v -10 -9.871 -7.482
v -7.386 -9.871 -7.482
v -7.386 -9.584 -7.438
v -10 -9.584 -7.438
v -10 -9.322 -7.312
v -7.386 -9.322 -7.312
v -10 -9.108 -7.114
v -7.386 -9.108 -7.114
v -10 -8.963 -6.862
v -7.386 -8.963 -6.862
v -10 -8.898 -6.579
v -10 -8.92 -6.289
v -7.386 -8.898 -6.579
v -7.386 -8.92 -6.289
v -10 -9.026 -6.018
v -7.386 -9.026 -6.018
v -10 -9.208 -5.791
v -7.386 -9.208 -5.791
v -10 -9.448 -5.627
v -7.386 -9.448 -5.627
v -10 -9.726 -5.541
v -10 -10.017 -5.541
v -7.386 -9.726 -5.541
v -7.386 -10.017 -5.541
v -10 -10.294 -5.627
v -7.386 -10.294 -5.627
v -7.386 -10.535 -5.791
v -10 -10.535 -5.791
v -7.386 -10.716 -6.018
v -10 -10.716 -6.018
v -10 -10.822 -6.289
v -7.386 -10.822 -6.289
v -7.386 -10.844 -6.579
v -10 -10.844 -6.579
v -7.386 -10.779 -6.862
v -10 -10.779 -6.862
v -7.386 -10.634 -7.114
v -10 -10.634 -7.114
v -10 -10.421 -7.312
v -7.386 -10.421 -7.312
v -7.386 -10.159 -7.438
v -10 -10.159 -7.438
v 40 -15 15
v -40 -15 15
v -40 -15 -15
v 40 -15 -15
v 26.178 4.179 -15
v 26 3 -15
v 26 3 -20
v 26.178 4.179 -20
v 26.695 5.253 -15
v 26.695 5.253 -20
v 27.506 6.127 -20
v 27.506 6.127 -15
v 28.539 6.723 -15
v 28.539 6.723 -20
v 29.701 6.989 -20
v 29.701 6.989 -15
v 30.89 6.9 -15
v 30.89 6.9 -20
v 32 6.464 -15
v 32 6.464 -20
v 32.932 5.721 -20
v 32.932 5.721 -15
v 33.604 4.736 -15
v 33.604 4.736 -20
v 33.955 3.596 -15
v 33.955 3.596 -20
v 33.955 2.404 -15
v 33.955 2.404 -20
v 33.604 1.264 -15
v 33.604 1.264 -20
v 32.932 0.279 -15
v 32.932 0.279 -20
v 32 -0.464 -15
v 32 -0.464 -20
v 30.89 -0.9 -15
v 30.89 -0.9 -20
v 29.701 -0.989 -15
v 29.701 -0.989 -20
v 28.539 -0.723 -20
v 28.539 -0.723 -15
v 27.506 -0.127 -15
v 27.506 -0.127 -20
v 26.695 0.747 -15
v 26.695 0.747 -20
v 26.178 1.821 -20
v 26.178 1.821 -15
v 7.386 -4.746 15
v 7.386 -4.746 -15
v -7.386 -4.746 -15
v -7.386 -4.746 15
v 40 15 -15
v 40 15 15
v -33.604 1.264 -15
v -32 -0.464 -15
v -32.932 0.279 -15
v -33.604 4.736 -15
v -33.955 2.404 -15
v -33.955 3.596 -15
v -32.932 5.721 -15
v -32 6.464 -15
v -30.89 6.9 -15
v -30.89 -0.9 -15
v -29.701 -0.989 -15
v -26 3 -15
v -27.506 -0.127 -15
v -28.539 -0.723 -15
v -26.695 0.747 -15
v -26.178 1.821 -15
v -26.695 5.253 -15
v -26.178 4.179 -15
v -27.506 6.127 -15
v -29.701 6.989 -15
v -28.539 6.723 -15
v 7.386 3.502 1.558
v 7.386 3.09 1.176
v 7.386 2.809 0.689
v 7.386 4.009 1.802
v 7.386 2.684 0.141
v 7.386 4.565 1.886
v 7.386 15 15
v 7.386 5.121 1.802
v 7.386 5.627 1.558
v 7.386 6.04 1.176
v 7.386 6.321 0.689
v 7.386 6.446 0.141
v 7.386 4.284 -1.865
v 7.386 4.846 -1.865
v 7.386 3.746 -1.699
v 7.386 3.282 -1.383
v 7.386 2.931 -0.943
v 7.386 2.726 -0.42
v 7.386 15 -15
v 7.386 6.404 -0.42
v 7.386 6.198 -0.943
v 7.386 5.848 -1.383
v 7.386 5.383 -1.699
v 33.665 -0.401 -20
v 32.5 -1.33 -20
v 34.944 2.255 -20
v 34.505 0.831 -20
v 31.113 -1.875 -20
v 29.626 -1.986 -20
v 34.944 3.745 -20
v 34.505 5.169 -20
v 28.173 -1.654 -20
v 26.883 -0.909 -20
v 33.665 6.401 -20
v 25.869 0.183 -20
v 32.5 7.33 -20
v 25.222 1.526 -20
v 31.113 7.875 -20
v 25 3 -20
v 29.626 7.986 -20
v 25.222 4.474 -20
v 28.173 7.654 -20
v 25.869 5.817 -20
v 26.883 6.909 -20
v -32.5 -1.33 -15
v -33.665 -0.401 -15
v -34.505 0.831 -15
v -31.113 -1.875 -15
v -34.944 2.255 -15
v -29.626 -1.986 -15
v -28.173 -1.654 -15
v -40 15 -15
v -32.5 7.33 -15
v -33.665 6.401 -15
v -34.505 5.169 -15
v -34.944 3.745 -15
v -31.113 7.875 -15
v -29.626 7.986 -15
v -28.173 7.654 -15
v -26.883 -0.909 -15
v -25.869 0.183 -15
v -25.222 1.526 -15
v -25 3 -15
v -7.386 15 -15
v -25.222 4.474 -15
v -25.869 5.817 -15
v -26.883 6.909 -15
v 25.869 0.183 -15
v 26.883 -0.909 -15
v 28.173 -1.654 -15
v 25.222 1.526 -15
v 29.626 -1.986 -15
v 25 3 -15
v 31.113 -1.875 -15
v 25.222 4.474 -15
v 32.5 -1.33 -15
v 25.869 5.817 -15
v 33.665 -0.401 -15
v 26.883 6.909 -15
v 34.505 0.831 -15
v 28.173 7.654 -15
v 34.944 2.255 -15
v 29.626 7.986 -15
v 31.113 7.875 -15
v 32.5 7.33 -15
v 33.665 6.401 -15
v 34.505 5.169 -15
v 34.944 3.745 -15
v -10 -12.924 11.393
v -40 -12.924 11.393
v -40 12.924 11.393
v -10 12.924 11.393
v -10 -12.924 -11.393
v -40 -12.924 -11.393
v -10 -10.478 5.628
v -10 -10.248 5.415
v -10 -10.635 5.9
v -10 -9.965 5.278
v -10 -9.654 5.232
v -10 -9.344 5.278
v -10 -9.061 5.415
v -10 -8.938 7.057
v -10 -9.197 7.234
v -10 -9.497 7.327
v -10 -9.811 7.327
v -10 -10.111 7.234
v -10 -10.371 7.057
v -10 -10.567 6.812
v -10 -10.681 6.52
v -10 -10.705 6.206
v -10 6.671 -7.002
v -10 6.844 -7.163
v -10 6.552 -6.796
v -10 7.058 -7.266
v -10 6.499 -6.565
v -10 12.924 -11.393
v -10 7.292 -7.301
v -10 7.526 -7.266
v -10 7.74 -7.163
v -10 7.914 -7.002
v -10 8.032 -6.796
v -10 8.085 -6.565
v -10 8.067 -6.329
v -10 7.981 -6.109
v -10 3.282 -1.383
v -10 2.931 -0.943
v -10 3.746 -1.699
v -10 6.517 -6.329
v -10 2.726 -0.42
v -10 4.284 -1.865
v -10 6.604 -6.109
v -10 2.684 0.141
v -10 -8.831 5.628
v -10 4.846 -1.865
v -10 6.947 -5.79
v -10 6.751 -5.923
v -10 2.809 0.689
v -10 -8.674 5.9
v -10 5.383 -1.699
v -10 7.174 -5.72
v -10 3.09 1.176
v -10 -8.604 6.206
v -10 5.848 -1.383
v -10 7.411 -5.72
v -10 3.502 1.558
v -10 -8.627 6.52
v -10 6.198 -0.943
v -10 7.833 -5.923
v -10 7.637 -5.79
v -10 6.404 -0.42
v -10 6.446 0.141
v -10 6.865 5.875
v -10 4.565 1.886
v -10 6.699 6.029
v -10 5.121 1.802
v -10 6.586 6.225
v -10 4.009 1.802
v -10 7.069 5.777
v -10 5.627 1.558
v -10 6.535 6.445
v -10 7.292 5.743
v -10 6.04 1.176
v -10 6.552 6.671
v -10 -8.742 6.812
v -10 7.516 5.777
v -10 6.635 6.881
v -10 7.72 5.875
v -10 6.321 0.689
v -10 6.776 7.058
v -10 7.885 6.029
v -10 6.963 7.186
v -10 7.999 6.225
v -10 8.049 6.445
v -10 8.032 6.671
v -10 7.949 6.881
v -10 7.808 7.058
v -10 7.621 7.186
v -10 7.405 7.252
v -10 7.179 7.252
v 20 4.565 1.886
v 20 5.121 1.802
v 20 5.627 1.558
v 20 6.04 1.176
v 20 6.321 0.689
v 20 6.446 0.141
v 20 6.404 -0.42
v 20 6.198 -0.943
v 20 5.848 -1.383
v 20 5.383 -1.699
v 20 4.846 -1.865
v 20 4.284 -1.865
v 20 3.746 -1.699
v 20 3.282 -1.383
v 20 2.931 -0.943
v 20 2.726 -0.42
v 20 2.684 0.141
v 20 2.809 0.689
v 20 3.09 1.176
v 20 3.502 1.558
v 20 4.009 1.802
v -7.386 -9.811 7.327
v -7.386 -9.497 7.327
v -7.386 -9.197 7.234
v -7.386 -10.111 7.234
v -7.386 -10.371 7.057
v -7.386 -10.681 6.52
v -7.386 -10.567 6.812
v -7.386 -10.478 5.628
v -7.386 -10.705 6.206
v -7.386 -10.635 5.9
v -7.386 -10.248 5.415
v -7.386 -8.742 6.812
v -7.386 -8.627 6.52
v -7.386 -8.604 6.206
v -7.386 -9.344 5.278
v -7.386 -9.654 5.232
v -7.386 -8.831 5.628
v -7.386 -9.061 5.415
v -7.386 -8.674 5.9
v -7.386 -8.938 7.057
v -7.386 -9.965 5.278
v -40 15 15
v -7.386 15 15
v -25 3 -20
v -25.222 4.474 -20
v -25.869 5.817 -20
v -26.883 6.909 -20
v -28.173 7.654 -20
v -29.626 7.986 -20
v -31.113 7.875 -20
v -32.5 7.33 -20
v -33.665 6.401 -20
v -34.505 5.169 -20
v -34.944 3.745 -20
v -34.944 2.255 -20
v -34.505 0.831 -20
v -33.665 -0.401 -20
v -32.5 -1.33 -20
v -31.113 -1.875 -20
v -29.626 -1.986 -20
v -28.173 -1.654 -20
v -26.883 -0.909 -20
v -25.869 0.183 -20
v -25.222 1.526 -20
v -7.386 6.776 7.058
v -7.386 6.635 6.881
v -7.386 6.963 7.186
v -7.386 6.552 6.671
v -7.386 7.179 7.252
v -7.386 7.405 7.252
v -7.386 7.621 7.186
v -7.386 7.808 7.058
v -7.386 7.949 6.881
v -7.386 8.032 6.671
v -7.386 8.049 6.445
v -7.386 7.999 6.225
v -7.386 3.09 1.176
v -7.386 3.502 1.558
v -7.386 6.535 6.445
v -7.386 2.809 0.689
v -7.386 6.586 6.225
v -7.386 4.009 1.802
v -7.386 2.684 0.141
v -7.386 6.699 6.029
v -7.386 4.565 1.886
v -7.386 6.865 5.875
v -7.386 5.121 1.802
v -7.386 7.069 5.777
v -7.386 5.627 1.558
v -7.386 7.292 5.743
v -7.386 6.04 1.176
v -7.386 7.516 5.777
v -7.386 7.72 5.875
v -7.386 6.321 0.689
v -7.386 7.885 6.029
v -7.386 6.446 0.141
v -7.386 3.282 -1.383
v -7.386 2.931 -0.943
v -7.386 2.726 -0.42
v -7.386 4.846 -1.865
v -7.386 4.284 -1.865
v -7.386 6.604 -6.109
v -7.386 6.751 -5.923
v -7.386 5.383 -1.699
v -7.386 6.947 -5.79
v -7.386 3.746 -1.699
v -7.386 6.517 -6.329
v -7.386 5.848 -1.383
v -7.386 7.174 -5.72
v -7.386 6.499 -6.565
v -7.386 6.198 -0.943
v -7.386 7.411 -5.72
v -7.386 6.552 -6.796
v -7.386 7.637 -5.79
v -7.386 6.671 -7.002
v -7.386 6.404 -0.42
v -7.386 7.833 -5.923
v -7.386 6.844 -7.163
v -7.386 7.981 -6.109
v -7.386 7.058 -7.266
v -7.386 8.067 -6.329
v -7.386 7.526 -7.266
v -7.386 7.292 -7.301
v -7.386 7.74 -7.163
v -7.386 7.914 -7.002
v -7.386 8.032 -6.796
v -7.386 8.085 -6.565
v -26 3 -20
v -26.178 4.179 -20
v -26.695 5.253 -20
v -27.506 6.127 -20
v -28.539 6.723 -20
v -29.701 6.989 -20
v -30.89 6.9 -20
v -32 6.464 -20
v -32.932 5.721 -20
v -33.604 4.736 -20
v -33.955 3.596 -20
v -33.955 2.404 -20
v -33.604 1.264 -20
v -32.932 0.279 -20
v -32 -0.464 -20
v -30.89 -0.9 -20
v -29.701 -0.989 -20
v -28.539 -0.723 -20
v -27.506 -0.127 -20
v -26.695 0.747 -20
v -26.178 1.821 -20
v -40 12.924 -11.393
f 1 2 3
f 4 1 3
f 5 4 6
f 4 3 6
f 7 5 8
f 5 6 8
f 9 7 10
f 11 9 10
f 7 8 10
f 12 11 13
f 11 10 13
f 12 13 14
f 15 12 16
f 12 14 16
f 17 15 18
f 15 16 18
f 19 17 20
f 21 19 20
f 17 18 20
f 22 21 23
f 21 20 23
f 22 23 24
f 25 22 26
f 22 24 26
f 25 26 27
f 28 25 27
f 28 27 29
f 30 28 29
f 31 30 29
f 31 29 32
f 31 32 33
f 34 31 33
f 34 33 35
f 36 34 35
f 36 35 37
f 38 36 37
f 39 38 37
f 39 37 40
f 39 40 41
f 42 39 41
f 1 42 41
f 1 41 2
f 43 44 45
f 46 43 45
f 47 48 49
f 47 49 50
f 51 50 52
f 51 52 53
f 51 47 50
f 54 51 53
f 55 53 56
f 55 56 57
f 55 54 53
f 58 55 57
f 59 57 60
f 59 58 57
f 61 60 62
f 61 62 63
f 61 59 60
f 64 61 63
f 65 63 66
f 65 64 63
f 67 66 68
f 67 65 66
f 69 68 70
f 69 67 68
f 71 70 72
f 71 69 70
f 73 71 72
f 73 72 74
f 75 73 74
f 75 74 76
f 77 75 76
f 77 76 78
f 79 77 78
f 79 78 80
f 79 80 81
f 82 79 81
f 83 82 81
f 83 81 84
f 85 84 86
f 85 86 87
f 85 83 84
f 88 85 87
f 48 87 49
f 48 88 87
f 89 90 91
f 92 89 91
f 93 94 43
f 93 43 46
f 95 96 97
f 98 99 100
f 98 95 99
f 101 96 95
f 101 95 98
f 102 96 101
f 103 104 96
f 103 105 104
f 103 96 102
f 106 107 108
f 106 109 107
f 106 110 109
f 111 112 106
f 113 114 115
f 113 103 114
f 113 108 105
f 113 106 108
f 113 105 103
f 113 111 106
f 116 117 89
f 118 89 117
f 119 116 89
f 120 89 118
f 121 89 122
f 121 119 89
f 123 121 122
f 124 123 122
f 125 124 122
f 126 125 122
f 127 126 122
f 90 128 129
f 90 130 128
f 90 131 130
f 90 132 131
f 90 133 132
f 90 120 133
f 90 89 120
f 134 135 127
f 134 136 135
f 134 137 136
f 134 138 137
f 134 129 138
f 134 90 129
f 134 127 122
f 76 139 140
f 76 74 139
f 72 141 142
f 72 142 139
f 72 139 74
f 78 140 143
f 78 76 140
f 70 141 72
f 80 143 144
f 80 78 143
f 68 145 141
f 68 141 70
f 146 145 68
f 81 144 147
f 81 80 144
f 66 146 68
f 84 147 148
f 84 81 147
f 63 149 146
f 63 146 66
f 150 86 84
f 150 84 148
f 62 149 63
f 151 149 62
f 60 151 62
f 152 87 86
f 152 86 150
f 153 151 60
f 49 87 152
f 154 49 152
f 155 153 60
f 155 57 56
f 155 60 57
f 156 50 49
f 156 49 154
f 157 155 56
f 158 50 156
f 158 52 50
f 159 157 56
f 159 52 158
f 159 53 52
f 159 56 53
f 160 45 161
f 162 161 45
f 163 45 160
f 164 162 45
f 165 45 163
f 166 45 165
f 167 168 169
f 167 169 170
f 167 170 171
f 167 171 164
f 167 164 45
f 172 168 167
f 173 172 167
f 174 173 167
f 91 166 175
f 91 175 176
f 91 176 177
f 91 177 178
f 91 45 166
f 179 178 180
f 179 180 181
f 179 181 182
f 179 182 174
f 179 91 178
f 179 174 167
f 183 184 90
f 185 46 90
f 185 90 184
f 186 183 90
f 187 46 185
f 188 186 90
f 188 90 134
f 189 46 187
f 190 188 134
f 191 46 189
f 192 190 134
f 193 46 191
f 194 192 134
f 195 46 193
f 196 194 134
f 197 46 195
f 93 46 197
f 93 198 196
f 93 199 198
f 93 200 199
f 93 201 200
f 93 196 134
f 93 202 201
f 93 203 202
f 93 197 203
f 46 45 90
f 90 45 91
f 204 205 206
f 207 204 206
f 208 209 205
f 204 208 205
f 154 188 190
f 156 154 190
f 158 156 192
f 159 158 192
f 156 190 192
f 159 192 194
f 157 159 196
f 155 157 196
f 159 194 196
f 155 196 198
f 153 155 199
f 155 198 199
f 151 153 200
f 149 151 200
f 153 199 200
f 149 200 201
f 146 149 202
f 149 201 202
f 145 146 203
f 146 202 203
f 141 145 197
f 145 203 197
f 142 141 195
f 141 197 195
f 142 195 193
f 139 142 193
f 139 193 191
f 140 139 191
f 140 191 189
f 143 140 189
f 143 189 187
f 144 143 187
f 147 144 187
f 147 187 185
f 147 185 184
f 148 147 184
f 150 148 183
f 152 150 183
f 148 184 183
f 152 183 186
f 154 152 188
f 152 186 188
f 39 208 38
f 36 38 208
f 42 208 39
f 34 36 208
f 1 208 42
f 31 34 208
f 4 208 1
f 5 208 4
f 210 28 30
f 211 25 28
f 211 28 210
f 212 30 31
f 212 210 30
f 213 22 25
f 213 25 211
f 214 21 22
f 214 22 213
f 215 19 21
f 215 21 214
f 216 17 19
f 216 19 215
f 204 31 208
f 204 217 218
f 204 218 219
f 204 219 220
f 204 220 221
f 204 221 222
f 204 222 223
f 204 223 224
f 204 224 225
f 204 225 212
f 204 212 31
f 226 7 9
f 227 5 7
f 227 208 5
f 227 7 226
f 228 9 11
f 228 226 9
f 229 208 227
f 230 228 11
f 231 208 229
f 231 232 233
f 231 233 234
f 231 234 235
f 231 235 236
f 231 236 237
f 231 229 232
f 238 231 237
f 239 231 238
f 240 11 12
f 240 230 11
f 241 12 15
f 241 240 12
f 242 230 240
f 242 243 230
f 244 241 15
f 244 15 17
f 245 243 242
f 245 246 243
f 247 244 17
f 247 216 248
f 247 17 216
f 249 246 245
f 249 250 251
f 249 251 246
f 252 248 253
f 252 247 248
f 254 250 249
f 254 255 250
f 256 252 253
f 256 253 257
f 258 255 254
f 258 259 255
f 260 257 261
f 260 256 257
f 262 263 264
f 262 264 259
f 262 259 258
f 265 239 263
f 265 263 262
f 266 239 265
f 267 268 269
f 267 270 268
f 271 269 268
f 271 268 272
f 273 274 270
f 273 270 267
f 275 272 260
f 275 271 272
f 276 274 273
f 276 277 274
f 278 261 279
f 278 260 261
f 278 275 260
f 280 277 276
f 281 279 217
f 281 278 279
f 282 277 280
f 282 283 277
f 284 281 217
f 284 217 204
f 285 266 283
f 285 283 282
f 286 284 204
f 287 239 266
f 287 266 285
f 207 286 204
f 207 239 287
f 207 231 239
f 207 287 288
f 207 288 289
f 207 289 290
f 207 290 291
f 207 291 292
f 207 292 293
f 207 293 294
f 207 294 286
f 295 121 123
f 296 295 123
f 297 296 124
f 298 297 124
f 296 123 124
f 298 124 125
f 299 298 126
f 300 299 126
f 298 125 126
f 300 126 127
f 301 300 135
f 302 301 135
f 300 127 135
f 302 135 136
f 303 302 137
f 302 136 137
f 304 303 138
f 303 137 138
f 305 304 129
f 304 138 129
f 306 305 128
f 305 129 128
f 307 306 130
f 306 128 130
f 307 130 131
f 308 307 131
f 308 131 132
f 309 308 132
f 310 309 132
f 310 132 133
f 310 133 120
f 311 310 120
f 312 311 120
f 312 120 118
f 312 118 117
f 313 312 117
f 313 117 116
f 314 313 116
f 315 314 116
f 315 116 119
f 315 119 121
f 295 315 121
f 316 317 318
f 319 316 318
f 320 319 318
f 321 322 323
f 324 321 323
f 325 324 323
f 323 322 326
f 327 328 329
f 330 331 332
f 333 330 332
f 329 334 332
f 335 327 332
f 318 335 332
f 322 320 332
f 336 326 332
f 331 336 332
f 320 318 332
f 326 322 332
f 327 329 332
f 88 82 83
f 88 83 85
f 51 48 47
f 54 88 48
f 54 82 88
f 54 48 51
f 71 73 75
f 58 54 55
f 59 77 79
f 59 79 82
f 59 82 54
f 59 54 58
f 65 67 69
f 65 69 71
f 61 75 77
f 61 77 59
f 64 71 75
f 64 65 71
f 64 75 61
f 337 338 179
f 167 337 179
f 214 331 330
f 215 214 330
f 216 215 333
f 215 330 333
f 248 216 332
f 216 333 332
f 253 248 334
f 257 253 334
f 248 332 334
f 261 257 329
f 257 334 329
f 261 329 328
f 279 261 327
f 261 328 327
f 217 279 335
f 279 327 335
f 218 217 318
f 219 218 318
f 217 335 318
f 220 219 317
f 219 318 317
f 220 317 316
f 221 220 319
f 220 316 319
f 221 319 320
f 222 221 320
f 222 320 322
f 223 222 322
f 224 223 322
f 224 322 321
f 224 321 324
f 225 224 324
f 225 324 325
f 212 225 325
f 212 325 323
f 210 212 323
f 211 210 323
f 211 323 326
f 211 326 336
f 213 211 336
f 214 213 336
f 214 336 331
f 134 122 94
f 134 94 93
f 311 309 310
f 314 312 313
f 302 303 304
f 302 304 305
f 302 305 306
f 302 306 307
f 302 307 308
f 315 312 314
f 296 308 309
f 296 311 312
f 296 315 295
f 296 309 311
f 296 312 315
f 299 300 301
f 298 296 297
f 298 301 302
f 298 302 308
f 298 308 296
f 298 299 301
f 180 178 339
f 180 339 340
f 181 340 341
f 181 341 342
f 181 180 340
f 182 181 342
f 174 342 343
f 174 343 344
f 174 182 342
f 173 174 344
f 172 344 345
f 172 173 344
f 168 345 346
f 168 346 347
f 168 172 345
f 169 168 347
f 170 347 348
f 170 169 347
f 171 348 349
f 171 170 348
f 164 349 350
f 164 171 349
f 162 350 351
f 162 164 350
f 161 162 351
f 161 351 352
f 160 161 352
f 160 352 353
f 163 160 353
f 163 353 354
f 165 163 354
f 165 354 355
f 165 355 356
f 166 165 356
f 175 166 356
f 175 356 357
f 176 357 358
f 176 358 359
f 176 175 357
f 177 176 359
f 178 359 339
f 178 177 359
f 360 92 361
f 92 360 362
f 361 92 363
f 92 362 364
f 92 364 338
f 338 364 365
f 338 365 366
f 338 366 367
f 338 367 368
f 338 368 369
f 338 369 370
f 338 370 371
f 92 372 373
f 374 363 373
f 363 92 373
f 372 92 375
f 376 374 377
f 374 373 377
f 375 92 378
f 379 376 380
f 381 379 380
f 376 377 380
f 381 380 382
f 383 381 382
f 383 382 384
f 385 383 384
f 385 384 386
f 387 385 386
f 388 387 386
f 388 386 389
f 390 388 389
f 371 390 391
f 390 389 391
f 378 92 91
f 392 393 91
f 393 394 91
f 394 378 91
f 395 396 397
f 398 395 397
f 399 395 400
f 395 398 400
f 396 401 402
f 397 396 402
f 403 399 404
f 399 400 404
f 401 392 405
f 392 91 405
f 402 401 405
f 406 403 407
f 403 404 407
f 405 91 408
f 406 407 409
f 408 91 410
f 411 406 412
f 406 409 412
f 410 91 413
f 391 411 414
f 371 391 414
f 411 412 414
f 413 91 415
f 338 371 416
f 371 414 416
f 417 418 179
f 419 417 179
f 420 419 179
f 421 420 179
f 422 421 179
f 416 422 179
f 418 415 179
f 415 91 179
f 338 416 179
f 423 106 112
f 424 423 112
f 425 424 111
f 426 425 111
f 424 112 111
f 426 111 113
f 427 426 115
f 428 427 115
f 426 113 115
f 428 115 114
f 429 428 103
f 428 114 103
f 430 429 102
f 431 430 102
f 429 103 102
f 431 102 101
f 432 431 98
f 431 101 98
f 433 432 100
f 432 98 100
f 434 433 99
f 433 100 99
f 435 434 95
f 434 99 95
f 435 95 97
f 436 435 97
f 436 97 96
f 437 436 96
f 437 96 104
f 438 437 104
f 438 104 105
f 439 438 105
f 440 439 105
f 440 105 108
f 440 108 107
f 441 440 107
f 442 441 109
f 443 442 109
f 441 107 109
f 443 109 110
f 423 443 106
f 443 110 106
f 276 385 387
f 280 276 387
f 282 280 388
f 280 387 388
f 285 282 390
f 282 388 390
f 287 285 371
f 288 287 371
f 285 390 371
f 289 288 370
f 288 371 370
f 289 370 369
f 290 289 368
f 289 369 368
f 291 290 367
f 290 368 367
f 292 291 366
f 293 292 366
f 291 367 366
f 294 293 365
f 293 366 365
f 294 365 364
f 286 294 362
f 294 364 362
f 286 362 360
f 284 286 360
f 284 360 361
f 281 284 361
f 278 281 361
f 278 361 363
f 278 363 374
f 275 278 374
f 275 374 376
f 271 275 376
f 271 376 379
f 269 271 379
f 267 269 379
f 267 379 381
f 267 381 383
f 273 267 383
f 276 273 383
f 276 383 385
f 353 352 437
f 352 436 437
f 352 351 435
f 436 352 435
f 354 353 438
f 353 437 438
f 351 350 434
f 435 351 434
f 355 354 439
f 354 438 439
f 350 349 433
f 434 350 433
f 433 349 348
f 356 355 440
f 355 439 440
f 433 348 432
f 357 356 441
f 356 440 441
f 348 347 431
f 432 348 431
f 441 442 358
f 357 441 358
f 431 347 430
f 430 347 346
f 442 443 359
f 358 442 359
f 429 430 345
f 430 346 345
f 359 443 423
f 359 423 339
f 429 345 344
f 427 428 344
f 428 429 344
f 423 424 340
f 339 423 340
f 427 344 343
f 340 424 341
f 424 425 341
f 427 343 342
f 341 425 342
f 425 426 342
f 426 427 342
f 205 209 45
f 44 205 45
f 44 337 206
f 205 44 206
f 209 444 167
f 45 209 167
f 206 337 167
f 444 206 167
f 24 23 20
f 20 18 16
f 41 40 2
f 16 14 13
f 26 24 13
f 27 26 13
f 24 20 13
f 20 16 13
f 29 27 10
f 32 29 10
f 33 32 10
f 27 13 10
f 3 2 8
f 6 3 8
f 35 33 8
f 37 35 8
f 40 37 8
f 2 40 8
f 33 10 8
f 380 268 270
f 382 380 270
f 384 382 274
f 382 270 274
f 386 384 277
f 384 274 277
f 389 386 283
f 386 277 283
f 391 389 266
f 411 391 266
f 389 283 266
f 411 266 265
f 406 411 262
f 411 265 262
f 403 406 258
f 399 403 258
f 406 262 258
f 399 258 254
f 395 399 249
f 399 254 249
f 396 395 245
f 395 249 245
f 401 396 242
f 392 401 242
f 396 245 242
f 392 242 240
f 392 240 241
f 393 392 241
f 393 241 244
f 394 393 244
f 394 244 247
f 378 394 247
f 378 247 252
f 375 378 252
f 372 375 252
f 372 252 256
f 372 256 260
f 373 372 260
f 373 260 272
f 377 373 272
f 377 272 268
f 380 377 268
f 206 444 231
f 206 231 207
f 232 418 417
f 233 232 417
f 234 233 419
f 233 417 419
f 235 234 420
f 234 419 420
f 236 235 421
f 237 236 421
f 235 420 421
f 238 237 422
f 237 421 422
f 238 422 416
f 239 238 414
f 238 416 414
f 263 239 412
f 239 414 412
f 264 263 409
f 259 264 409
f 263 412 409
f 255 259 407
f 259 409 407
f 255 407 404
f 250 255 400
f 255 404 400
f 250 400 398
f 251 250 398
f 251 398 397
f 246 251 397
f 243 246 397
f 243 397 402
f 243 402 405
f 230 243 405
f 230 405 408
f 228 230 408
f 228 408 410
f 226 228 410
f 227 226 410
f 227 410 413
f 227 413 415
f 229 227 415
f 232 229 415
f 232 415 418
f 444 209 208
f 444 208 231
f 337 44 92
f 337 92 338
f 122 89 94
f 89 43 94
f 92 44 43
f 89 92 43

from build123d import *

# Parameters (mm, degrees)
SKICA1_W                 = 30
SKICA1_H                 = 30
P_IDAT_VYSUNUT_M1_DEPTH  = 40
SKICA2_W                 = 14.772421132
SKICA2_H                 = 61.833184582
ODEBRAT_VYSUNUT_M1_DEPTH = 180
SKICA3_W                 = 22.785077148
SKICA3_H                 = 25.847285536
ODEBRAT_VYSUNUT_M2_DEPTH = 30
SKICA4_R                 = 0.794930896
SKICA4_R_2               = 0.758797673
SKICA4_R_3               = 1.053455412
SKICA4_R_4               = 0.975597008
ODEBRAT_VYSUNUT_M3_DEPTH = 60
SKICA5_R                 = 1.886179275
ODEBRAT_VYSUNUT_M4_DEPTH = 30
SKICA6_R                 = 5
SKICA6_R_2               = 4
P_IDAT_VYSUNUT_M2_DEPTH  = 5


with BuildPart() as part:
    # Skica1 → Přidat vysunutím1 (new body, symmetric)
    with BuildSketch(Plane(origin=(0, 0, 0), x_dir=(0, 0, -1), z_dir=(1, 0, 0))):
        Rectangle(SKICA1_W, SKICA1_H)
    extrude(amount=P_IDAT_VYSUNUT_M1_DEPTH, both=True)

    # Skica2 → Odebrat vysunutím1 (cut)
    with BuildSketch(Plane(origin=(0, 0, -15), x_dir=(-1, 0, 0), z_dir=(0, 0, -1))):
        with Locations((0, 26.170702713)):
            Rectangle(SKICA2_W, SKICA2_H)
    extrude(amount=-ODEBRAT_VYSUNUT_M1_DEPTH, mode=Mode.SUBTRACT)

    # Skica3 → Odebrat vysunutím2 (cut)
    with BuildSketch(Plane.ZY.offset(40)):
        Rectangle(SKICA3_W, SKICA3_H)
    extrude(amount=-ODEBRAT_VYSUNUT_M2_DEPTH, mode=Mode.SUBTRACT)

    # Skica4 → Odebrat vysunutím3 (cut)
    with BuildSketch(Plane(origin=(-7.386210566, 0, 0), x_dir=(0, 0, -1), z_dir=(1, 0, 0))):
        with Locations((6.506049624, 7.292174822)):
            Circle(SKICA4_R)
        with Locations((-6.501910486, 7.292174822)):
            Circle(SKICA4_R_2)
        with Locations((-6.285111151, -9.654306544)):
            Circle(SKICA4_R_3)
        with Locations((6.506049624, -9.87110588)):
            Circle(SKICA4_R_4)
    extrude(amount=-ODEBRAT_VYSUNUT_M3_DEPTH, mode=Mode.SUBTRACT)

    # Skica5 → Odebrat vysunutím4 (cut)
    with BuildSketch(Plane.ZY.offset(10)):
        with Locations((0, 4.56487451)):
            Circle(SKICA5_R)
    extrude(amount=-ODEBRAT_VYSUNUT_M4_DEPTH, mode=Mode.SUBTRACT)

    # Skica6 → Přidat vysunutím2 (add)
    with BuildSketch(Plane(origin=(0, 0, -15), x_dir=(-1, 0, 0), z_dir=(0, 0, -1))):
        with Locations((-30, 3)):
            Circle(SKICA6_R)
        with Locations((-30, 3)):
            Circle(SKICA6_R_2, mode=Mode.SUBTRACT)
    p_idat_vysunut_m2 = extrude(amount=P_IDAT_VYSUNUT_M2_DEPTH)

    # Zrcadlit1: Přidat vysunutím2 across plane
    add(p_idat_vysunut_m2.mirror(Plane(origin=(0, 0, 0), x_dir=(0, 0, 1), z_dir=(1, 0, 0))))


solid = part.part
